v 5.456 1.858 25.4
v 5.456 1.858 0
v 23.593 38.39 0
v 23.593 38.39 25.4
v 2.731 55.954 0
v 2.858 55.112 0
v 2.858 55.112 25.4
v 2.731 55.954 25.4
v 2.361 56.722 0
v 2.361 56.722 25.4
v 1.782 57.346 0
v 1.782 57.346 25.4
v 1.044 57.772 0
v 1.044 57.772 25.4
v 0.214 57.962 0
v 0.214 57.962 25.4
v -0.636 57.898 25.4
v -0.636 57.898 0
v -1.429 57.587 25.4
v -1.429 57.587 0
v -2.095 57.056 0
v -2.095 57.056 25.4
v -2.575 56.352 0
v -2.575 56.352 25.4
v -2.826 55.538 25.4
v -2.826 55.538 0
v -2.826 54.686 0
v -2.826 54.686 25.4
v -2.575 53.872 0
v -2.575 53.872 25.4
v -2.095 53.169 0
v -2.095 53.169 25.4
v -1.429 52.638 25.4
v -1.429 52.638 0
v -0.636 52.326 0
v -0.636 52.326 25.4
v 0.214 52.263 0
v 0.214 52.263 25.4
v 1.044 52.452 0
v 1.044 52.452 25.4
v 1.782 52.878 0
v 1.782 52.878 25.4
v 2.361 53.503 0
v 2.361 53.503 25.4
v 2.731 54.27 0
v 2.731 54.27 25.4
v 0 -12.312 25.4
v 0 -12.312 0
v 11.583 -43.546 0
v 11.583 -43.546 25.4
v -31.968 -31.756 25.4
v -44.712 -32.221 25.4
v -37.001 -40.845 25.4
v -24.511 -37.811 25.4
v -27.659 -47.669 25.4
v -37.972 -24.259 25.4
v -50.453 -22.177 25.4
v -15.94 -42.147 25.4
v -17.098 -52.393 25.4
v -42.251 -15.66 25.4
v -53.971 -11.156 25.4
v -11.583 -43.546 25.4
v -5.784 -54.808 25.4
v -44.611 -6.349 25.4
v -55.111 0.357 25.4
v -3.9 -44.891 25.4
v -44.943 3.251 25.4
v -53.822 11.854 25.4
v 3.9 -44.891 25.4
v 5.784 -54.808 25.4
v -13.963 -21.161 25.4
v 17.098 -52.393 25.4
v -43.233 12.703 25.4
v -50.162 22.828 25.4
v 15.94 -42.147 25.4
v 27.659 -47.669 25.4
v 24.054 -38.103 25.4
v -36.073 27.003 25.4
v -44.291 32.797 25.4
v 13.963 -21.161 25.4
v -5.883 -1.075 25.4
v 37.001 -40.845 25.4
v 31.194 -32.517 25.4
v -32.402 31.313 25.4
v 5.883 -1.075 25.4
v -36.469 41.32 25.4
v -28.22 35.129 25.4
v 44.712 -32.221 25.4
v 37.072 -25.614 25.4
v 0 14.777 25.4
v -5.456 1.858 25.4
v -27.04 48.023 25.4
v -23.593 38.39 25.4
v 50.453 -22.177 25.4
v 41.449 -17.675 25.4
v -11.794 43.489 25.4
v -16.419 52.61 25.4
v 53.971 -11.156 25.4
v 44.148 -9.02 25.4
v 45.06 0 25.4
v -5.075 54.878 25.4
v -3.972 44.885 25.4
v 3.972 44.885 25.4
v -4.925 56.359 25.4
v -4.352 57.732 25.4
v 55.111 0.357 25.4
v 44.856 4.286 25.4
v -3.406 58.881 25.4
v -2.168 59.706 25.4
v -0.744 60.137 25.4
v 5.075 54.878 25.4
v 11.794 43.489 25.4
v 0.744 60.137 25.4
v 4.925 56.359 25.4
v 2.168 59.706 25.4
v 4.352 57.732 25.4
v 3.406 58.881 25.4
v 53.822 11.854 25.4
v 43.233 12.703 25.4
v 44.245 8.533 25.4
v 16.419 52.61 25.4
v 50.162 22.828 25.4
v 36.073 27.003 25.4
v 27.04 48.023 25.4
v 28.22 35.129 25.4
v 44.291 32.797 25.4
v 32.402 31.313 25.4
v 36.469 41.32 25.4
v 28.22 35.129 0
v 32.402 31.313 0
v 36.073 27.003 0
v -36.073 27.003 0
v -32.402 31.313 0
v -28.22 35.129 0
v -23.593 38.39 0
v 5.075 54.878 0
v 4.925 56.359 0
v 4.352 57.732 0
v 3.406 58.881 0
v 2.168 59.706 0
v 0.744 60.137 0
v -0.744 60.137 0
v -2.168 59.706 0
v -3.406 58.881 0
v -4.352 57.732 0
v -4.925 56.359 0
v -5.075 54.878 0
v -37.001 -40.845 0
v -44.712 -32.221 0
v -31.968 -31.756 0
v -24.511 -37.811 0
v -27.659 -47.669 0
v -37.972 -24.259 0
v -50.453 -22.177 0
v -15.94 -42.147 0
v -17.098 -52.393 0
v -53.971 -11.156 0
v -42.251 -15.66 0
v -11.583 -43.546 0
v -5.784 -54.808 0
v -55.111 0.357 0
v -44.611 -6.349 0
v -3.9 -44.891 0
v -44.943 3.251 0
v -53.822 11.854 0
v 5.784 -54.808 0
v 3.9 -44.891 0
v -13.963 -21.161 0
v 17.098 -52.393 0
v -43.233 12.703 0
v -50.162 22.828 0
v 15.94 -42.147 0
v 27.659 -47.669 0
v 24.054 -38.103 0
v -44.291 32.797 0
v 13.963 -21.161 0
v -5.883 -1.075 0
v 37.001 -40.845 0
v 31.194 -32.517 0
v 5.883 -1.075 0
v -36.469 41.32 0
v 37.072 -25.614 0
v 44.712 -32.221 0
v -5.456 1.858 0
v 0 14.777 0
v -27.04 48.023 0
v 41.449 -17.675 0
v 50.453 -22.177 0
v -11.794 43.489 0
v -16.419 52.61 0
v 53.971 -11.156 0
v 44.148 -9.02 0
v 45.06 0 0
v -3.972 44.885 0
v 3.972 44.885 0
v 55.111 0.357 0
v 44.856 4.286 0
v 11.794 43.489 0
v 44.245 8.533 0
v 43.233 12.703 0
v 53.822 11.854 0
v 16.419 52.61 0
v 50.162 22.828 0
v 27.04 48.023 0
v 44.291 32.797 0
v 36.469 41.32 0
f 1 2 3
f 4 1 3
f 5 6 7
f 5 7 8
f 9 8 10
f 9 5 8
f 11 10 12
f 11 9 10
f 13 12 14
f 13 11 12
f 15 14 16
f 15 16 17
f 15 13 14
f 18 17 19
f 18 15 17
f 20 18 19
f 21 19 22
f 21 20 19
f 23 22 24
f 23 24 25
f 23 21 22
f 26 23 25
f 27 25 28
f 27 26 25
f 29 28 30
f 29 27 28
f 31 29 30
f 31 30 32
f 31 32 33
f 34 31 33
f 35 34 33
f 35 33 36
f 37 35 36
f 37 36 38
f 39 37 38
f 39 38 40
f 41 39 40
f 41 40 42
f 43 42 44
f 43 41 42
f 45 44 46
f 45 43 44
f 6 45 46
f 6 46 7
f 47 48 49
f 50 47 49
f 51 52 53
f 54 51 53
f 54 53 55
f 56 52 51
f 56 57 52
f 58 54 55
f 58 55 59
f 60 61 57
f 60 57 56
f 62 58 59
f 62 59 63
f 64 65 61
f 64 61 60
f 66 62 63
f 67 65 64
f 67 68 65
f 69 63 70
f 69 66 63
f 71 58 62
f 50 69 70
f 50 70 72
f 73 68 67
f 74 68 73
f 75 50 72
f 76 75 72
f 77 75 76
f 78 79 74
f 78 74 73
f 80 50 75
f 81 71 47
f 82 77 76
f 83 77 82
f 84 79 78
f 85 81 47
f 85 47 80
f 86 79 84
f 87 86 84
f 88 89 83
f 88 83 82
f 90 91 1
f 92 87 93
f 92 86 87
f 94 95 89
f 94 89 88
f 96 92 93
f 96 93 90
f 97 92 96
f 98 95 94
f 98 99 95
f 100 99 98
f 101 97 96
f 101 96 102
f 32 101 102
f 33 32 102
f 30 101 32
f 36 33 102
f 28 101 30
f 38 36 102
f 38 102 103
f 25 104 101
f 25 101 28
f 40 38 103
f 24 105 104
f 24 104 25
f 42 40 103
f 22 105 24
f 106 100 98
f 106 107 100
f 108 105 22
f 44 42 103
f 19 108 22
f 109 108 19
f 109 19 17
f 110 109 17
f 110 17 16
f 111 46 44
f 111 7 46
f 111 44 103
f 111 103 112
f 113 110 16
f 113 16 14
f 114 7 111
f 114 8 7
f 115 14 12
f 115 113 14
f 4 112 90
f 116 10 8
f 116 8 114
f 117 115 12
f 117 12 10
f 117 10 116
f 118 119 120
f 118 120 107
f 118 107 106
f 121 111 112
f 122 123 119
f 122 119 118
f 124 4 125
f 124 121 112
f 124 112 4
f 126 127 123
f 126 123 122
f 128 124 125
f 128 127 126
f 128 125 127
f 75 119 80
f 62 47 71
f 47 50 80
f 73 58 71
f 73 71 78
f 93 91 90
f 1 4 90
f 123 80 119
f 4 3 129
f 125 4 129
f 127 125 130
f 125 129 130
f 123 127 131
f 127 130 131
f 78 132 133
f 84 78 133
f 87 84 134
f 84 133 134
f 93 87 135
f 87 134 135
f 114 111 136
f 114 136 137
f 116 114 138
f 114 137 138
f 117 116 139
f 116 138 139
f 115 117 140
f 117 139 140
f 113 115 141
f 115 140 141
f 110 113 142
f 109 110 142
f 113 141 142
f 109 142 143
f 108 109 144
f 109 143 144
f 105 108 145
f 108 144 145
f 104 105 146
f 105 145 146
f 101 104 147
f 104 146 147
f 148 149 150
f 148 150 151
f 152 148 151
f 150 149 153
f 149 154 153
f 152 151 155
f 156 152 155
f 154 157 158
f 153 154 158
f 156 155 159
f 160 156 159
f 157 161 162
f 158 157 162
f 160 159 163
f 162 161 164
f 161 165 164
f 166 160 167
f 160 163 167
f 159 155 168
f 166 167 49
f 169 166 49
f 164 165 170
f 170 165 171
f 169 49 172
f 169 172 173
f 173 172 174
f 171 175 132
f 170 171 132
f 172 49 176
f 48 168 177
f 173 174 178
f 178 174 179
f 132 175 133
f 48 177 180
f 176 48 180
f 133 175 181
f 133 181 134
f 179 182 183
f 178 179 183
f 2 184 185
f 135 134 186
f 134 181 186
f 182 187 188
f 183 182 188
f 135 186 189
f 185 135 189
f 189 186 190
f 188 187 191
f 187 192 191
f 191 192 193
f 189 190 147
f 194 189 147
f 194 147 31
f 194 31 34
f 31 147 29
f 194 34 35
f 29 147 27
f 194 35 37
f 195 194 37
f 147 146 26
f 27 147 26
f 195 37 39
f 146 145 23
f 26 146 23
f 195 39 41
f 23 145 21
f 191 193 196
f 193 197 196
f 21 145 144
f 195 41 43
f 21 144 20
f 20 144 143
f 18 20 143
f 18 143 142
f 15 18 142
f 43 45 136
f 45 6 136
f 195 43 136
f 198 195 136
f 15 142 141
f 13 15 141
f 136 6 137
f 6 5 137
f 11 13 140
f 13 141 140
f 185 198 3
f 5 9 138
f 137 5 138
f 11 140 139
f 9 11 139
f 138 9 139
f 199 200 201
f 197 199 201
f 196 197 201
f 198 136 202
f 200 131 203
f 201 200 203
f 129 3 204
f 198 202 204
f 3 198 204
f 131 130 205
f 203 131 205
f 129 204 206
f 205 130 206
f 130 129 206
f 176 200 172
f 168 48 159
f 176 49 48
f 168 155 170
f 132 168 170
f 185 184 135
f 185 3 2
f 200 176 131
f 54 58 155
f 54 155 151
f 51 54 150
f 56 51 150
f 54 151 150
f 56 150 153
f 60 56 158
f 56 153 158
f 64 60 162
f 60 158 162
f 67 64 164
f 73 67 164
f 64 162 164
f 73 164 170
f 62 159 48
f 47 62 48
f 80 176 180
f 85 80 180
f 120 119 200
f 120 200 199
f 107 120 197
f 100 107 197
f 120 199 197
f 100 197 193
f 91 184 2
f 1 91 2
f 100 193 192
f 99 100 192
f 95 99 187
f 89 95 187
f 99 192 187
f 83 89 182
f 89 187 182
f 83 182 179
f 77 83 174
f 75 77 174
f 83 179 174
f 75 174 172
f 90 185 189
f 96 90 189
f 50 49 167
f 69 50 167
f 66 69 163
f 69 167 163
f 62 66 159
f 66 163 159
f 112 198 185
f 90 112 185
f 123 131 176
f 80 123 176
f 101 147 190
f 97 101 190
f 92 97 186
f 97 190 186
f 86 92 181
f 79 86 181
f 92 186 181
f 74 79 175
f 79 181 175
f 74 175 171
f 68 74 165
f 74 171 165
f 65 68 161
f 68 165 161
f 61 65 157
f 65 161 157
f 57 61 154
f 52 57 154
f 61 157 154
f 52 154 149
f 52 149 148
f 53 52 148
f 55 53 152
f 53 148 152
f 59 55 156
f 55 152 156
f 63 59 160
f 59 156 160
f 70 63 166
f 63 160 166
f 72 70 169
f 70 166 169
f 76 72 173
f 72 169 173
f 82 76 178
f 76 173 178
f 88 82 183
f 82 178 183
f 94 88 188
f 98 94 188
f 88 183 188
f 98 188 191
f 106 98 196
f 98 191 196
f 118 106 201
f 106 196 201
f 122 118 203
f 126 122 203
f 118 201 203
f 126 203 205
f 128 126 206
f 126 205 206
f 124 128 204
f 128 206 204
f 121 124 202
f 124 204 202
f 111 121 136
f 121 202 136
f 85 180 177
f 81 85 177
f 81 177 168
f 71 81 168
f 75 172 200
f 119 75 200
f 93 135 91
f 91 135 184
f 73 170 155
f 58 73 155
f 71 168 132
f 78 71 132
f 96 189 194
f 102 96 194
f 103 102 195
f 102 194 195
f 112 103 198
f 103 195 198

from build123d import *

# Parameters (mm, degrees)
F0_R     = 2.8575
F1_DEPTH = 25.4


with BuildPart() as f1:
    # F0 (on Top) → F1 (new body)
    with BuildSketch(Plane.XY):
        with BuildLine():
            ThreePointArc((5.074602, 54.878098), (0, 60.192224), (-5.074602, 54.878098))
            ThreePointArc((-5.074602, 54.878098), (0, -55.112224), (5.074602, 54.878098))
        make_face()
        with BuildLine():
            ThreePointArc((43.232637, 12.702506), (44.60091, 6.416646), (45.060121, 0))
            ThreePointArc((45.060121, 0), (37.071988, -25.614102), (15.939817, -42.146611))
            ThreePointArc((15.939817, -42.146611), (13.779025, -42.901667), (11.582679, -43.546023))
            ThreePointArc((11.582679, -43.546023), (0, -45.060121), (-11.582679, -43.546023))
            ThreePointArc((-11.582679, -43.546023), (-13.779025, -42.901667), (-15.939817, -42.146611))
            ThreePointArc((-15.939817, -42.146611), (-40.341681, -20.073946), (-43.232637, 12.702506))
            ThreePointArc((-43.232637, 12.702506), (-40.292177, 20.173126), (-36.072623, 27.00334))
            ThreePointArc((-36.072623, 27.00334), (-30.371021, 33.286869), (-23.592574, 38.390168))
            ThreePointArc((-23.592574, 38.390168), (-17.875835, 41.362653), (-11.793582, 43.489378))
            ThreePointArc((-11.793582, 43.489378), (0, 45.060121), (11.793582, 43.489378))
            ThreePointArc((11.793582, 43.489378), (17.875835, 41.362653), (23.592574, 38.390168))
            ThreePointArc((23.592574, 38.390168), (30.371021, 33.286869), (36.072623, 27.00334))
            ThreePointArc((36.072623, 27.00334), (40.292177, 20.173126), (43.232637, 12.702506))
        make_face(mode=Mode.SUBTRACT)
        with Locations((0, 55.112224)):
            Circle(F0_R, mode=Mode.SUBTRACT)
        with BuildLine():
            Line((5.456394, 1.858352), (23.592574, 38.390168))
            ThreePointArc((23.592574, 38.390168), (17.875835, 41.362653), (11.793582, 43.489378))
            Line((11.793582, 43.489378), (0, 14.776533))
            Line((0, 14.776533), (-11.793582, 43.489378))
            ThreePointArc((-11.793582, 43.489378), (-17.875835, 41.362653), (-23.592574, 38.390168))
            Line((-23.592574, 38.390168), (-5.456394, 1.858352))
            Line((-5.456394, 1.858352), (0, 1.858352))
            Line((0, 1.858352), (5.456394, 1.858352))
        make_face()
        with BuildLine():
            Line((15.939817, -42.146611), (43.232637, 12.702506))
            ThreePointArc((43.232637, 12.702506), (40.292177, 20.173126), (36.072623, 27.00334))
            Line((36.072623, 27.00334), (13.962634, -21.160696))
            Line((13.962634, -21.160696), (5.882978, -1.074824))
            Line((5.882978, -1.074824), (0, -1.074824))
            Line((0, -1.074824), (-5.882978, -1.074824))
            Line((-5.882978, -1.074824), (-13.962634, -21.160696))
            Line((-13.962634, -21.160696), (-36.072623, 27.00334))
            ThreePointArc((-36.072623, 27.00334), (-40.292177, 20.173126), (-43.232637, 12.702506))
            Line((-43.232637, 12.702506), (-15.939817, -42.146611))
            ThreePointArc((-15.939817, -42.146611), (-13.779025, -42.901667), (-11.582679, -43.546023))
            Line((-11.582679, -43.546023), (0, -12.311705))
            Line((0, -12.311705), (11.582679, -43.546023))
            ThreePointArc((11.582679, -43.546023), (13.779025, -42.901667), (15.939817, -42.146611))
        make_face()
    extrude(amount=F1_DEPTH)


solid = f1.part
